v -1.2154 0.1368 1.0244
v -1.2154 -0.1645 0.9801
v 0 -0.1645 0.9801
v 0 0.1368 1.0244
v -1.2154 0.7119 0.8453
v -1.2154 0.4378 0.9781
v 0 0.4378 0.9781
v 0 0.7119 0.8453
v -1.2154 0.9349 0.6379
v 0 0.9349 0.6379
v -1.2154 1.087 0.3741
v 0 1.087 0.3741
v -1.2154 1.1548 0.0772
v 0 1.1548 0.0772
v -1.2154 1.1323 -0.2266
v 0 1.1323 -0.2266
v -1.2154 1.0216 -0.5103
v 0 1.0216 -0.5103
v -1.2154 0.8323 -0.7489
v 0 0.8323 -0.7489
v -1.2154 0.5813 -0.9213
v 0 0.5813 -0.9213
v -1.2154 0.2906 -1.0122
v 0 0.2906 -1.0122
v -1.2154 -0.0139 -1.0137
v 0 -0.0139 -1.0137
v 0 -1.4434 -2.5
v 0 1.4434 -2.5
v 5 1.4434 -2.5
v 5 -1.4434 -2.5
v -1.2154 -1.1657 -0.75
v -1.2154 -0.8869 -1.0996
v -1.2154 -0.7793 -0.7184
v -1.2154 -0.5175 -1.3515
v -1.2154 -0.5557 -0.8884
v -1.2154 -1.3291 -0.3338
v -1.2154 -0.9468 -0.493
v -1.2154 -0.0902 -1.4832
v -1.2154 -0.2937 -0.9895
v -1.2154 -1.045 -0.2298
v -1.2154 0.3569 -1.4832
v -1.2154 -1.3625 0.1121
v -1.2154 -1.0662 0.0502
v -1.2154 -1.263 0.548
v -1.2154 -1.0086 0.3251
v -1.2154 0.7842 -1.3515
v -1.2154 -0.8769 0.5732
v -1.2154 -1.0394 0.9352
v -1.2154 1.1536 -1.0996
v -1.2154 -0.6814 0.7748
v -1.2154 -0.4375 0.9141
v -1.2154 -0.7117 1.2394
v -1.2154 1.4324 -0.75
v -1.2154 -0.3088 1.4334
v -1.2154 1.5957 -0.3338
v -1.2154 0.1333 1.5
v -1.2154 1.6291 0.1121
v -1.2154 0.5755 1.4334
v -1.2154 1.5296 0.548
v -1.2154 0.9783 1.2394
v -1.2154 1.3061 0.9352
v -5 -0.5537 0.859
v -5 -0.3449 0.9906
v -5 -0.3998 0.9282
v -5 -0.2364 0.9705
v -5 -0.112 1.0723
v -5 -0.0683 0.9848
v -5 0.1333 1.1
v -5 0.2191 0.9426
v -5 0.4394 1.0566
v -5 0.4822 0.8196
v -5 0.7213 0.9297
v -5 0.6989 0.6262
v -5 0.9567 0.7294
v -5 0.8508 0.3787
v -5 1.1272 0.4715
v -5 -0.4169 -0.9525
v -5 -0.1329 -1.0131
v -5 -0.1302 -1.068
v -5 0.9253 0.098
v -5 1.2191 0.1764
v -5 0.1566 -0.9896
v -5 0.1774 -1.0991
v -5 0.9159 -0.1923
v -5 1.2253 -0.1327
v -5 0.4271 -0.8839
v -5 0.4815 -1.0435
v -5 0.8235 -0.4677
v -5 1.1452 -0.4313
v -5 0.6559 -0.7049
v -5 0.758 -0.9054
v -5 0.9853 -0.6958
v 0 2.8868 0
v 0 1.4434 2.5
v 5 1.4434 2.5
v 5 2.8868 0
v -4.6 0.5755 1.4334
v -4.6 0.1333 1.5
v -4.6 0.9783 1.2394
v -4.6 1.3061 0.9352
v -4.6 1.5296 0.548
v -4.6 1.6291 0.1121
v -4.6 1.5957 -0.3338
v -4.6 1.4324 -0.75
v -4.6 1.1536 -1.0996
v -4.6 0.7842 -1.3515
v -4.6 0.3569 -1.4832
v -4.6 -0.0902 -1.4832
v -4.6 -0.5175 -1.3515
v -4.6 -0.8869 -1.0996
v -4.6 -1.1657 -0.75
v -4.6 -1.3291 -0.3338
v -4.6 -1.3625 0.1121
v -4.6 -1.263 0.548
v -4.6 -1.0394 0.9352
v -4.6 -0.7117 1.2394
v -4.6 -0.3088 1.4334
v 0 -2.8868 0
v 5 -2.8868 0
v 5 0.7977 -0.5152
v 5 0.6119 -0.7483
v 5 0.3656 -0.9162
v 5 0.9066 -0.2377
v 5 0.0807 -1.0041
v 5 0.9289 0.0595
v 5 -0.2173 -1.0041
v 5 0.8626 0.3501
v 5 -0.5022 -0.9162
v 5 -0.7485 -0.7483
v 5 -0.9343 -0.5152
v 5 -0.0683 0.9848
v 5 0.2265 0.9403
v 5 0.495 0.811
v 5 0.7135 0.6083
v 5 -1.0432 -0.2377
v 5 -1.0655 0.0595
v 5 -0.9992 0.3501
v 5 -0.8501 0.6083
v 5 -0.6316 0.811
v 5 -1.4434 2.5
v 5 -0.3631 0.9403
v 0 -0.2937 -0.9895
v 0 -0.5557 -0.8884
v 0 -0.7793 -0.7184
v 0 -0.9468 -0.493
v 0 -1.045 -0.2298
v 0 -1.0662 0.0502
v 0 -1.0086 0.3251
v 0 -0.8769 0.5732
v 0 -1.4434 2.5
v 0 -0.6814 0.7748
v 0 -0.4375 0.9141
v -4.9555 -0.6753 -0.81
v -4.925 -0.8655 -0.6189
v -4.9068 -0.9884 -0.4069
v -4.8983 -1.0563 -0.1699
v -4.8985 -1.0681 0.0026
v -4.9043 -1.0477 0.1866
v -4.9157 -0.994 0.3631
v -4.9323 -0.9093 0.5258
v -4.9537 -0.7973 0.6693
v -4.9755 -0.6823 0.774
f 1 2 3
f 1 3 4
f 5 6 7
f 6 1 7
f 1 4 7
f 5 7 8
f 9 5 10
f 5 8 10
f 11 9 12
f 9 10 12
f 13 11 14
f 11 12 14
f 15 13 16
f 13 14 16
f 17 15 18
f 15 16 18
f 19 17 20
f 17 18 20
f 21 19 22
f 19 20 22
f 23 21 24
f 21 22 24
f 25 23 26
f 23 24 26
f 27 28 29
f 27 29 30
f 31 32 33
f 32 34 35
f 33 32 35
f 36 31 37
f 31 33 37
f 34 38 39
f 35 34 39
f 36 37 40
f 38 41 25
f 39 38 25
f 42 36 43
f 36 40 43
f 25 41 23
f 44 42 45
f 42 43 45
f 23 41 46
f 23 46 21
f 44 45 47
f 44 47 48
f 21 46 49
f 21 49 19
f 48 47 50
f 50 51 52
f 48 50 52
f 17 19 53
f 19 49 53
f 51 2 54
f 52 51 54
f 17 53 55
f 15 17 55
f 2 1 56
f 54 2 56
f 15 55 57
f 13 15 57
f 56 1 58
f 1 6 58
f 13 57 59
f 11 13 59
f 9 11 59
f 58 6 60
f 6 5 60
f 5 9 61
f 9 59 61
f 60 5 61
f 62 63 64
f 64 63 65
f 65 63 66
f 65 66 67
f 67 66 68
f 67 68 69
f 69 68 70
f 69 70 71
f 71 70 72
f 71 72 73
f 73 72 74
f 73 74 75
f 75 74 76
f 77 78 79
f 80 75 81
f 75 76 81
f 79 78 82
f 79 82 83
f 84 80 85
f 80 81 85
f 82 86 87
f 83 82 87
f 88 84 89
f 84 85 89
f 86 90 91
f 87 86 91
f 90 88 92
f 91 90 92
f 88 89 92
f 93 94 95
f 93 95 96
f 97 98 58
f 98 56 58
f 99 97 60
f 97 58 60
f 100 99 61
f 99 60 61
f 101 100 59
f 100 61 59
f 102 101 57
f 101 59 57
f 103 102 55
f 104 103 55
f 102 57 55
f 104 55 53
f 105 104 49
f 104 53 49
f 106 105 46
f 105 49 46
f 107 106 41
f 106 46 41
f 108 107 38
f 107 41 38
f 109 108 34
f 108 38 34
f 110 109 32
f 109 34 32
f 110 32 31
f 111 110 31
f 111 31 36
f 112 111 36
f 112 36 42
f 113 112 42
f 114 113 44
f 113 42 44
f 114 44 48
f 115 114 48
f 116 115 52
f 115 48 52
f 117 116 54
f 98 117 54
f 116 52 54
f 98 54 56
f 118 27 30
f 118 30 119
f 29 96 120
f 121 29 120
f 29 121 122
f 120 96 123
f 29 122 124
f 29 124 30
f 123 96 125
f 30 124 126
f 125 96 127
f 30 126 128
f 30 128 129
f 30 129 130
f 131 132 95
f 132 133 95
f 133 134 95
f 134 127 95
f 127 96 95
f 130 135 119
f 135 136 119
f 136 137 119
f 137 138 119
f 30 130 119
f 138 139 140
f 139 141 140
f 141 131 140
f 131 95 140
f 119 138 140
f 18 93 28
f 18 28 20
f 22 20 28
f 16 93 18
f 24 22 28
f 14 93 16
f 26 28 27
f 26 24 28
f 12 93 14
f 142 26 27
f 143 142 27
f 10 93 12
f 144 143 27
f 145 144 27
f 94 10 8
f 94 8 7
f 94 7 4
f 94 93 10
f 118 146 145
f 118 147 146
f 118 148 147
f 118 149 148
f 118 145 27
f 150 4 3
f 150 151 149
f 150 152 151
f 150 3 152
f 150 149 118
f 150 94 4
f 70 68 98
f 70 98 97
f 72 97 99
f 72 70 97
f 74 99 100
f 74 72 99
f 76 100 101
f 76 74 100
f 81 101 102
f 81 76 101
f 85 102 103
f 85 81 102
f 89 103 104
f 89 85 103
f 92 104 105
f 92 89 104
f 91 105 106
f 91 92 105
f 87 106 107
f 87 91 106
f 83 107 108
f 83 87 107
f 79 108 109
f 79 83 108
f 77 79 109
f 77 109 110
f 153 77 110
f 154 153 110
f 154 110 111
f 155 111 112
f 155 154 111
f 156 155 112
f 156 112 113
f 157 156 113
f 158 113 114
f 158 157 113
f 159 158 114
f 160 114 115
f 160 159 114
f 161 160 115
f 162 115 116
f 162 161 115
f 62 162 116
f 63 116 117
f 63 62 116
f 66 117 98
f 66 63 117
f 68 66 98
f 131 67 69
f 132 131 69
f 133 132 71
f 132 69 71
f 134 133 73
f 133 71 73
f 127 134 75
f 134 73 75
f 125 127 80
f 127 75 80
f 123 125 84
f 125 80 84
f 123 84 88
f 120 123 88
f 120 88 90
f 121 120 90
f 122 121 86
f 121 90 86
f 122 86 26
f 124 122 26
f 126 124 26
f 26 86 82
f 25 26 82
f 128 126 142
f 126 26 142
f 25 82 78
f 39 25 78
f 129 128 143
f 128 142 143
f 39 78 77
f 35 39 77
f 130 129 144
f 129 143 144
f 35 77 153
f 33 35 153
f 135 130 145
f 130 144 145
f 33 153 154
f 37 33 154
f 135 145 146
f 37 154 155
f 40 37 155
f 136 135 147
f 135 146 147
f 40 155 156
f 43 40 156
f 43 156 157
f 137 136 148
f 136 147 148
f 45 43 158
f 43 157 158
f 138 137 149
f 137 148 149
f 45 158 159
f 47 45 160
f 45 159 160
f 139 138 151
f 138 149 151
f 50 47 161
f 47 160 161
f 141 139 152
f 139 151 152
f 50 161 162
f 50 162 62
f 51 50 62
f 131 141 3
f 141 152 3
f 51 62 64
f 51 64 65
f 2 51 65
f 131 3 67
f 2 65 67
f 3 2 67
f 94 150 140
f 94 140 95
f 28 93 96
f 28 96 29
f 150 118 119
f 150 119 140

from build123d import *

# Parameters (mm, degrees)
BOSS_EXTRU_1_DEPTH                = 5
DIAM_TRE_DU_PER_AGE_2_0_2_1_D     = 2
DIAM_TRE_DU_PER_AGE_2_0_2_1_DEPTH = 10
DIAM_TRE_DU_PER_AGE_2_0_2_1_TIP   = 0.600860619
CHANFREIN1_SIZE                   = 0.4


with BuildPart() as part:
    # Esquisse1 → Boss.-Extru.1 (new body)
    with BuildSketch(Plane(origin=(0, 0, 0), x_dir=(0, -1, 0), z_dir=(-1, 0, 0))):
        Polygon((-1.443375672, -2.5), (1.443375674, -2.5), (2.886751347, 1e-09), (1.443375673, 2.5), (-1.443375673, 2.5), (-2.886751345, 1e-09), align=None)
    extrude(amount=-BOSS_EXTRU_1_DEPTH)

    # Esquisse2 → Révolution1 (revolve)
    with BuildSketch(Plane(origin=(0, 0, 0), x_dir=(-1, 0, 0), z_dir=(0, 0, -1)), mode=Mode.PRIVATE) as r_volution1_sk:
        Polygon((0, 1.157712139), (0, 0.13332547), (5, 0.13332547), (5, 1.63332547), (1.215350333, 1.63332547), (1.215350333, 1.157712139), align=None)
    revolve(r_volution1_sk.sketch.rotate(Axis((0, 0.13332547, 0), (-1, 0, 0)), 270), axis=Axis((0, 0.13332547, 0), (-1, 0, 0)))

    # Diamètre du perçage Ø2.0 (2)1
    with Locations(Plane(origin=(5, 0, 0), x_dir=(0, 0, -1), z_dir=(1, 0, 0))):
        with Locations((0.015228416, -0.068295067)):
            Hole(DIAM_TRE_DU_PER_AGE_2_0_2_1_D / 2, depth=DIAM_TRE_DU_PER_AGE_2_0_2_1_DEPTH)
            with Locations((0, 0, -(DIAM_TRE_DU_PER_AGE_2_0_2_1_DEPTH + DIAM_TRE_DU_PER_AGE_2_0_2_1_TIP / 2))):  # 118° drill point
                Cone(0, DIAM_TRE_DU_PER_AGE_2_0_2_1_D / 2, DIAM_TRE_DU_PER_AGE_2_0_2_1_TIP, mode=Mode.SUBTRACT)

    # Chanfrein1
    # the kernel refuses this chamfer: 0.4 mm, written as the material it takes off along each edge
    with BuildSketch(Plane(origin=(-5, 0.13332547, 0), x_dir=(0, 0, 1), z_dir=(0, -1, 0))) as chanfrein1_piece_1:
        Polygon((1.5, -CHANFREIN1_SIZE), (1.5 - CHANFREIN1_SIZE, 0), (1.5, 0), align=None)
    revolve(axis=Axis((-5, 0.13332547, 0), (-1, 0, 0)), mode=Mode.SUBTRACT)


solid = part.part
